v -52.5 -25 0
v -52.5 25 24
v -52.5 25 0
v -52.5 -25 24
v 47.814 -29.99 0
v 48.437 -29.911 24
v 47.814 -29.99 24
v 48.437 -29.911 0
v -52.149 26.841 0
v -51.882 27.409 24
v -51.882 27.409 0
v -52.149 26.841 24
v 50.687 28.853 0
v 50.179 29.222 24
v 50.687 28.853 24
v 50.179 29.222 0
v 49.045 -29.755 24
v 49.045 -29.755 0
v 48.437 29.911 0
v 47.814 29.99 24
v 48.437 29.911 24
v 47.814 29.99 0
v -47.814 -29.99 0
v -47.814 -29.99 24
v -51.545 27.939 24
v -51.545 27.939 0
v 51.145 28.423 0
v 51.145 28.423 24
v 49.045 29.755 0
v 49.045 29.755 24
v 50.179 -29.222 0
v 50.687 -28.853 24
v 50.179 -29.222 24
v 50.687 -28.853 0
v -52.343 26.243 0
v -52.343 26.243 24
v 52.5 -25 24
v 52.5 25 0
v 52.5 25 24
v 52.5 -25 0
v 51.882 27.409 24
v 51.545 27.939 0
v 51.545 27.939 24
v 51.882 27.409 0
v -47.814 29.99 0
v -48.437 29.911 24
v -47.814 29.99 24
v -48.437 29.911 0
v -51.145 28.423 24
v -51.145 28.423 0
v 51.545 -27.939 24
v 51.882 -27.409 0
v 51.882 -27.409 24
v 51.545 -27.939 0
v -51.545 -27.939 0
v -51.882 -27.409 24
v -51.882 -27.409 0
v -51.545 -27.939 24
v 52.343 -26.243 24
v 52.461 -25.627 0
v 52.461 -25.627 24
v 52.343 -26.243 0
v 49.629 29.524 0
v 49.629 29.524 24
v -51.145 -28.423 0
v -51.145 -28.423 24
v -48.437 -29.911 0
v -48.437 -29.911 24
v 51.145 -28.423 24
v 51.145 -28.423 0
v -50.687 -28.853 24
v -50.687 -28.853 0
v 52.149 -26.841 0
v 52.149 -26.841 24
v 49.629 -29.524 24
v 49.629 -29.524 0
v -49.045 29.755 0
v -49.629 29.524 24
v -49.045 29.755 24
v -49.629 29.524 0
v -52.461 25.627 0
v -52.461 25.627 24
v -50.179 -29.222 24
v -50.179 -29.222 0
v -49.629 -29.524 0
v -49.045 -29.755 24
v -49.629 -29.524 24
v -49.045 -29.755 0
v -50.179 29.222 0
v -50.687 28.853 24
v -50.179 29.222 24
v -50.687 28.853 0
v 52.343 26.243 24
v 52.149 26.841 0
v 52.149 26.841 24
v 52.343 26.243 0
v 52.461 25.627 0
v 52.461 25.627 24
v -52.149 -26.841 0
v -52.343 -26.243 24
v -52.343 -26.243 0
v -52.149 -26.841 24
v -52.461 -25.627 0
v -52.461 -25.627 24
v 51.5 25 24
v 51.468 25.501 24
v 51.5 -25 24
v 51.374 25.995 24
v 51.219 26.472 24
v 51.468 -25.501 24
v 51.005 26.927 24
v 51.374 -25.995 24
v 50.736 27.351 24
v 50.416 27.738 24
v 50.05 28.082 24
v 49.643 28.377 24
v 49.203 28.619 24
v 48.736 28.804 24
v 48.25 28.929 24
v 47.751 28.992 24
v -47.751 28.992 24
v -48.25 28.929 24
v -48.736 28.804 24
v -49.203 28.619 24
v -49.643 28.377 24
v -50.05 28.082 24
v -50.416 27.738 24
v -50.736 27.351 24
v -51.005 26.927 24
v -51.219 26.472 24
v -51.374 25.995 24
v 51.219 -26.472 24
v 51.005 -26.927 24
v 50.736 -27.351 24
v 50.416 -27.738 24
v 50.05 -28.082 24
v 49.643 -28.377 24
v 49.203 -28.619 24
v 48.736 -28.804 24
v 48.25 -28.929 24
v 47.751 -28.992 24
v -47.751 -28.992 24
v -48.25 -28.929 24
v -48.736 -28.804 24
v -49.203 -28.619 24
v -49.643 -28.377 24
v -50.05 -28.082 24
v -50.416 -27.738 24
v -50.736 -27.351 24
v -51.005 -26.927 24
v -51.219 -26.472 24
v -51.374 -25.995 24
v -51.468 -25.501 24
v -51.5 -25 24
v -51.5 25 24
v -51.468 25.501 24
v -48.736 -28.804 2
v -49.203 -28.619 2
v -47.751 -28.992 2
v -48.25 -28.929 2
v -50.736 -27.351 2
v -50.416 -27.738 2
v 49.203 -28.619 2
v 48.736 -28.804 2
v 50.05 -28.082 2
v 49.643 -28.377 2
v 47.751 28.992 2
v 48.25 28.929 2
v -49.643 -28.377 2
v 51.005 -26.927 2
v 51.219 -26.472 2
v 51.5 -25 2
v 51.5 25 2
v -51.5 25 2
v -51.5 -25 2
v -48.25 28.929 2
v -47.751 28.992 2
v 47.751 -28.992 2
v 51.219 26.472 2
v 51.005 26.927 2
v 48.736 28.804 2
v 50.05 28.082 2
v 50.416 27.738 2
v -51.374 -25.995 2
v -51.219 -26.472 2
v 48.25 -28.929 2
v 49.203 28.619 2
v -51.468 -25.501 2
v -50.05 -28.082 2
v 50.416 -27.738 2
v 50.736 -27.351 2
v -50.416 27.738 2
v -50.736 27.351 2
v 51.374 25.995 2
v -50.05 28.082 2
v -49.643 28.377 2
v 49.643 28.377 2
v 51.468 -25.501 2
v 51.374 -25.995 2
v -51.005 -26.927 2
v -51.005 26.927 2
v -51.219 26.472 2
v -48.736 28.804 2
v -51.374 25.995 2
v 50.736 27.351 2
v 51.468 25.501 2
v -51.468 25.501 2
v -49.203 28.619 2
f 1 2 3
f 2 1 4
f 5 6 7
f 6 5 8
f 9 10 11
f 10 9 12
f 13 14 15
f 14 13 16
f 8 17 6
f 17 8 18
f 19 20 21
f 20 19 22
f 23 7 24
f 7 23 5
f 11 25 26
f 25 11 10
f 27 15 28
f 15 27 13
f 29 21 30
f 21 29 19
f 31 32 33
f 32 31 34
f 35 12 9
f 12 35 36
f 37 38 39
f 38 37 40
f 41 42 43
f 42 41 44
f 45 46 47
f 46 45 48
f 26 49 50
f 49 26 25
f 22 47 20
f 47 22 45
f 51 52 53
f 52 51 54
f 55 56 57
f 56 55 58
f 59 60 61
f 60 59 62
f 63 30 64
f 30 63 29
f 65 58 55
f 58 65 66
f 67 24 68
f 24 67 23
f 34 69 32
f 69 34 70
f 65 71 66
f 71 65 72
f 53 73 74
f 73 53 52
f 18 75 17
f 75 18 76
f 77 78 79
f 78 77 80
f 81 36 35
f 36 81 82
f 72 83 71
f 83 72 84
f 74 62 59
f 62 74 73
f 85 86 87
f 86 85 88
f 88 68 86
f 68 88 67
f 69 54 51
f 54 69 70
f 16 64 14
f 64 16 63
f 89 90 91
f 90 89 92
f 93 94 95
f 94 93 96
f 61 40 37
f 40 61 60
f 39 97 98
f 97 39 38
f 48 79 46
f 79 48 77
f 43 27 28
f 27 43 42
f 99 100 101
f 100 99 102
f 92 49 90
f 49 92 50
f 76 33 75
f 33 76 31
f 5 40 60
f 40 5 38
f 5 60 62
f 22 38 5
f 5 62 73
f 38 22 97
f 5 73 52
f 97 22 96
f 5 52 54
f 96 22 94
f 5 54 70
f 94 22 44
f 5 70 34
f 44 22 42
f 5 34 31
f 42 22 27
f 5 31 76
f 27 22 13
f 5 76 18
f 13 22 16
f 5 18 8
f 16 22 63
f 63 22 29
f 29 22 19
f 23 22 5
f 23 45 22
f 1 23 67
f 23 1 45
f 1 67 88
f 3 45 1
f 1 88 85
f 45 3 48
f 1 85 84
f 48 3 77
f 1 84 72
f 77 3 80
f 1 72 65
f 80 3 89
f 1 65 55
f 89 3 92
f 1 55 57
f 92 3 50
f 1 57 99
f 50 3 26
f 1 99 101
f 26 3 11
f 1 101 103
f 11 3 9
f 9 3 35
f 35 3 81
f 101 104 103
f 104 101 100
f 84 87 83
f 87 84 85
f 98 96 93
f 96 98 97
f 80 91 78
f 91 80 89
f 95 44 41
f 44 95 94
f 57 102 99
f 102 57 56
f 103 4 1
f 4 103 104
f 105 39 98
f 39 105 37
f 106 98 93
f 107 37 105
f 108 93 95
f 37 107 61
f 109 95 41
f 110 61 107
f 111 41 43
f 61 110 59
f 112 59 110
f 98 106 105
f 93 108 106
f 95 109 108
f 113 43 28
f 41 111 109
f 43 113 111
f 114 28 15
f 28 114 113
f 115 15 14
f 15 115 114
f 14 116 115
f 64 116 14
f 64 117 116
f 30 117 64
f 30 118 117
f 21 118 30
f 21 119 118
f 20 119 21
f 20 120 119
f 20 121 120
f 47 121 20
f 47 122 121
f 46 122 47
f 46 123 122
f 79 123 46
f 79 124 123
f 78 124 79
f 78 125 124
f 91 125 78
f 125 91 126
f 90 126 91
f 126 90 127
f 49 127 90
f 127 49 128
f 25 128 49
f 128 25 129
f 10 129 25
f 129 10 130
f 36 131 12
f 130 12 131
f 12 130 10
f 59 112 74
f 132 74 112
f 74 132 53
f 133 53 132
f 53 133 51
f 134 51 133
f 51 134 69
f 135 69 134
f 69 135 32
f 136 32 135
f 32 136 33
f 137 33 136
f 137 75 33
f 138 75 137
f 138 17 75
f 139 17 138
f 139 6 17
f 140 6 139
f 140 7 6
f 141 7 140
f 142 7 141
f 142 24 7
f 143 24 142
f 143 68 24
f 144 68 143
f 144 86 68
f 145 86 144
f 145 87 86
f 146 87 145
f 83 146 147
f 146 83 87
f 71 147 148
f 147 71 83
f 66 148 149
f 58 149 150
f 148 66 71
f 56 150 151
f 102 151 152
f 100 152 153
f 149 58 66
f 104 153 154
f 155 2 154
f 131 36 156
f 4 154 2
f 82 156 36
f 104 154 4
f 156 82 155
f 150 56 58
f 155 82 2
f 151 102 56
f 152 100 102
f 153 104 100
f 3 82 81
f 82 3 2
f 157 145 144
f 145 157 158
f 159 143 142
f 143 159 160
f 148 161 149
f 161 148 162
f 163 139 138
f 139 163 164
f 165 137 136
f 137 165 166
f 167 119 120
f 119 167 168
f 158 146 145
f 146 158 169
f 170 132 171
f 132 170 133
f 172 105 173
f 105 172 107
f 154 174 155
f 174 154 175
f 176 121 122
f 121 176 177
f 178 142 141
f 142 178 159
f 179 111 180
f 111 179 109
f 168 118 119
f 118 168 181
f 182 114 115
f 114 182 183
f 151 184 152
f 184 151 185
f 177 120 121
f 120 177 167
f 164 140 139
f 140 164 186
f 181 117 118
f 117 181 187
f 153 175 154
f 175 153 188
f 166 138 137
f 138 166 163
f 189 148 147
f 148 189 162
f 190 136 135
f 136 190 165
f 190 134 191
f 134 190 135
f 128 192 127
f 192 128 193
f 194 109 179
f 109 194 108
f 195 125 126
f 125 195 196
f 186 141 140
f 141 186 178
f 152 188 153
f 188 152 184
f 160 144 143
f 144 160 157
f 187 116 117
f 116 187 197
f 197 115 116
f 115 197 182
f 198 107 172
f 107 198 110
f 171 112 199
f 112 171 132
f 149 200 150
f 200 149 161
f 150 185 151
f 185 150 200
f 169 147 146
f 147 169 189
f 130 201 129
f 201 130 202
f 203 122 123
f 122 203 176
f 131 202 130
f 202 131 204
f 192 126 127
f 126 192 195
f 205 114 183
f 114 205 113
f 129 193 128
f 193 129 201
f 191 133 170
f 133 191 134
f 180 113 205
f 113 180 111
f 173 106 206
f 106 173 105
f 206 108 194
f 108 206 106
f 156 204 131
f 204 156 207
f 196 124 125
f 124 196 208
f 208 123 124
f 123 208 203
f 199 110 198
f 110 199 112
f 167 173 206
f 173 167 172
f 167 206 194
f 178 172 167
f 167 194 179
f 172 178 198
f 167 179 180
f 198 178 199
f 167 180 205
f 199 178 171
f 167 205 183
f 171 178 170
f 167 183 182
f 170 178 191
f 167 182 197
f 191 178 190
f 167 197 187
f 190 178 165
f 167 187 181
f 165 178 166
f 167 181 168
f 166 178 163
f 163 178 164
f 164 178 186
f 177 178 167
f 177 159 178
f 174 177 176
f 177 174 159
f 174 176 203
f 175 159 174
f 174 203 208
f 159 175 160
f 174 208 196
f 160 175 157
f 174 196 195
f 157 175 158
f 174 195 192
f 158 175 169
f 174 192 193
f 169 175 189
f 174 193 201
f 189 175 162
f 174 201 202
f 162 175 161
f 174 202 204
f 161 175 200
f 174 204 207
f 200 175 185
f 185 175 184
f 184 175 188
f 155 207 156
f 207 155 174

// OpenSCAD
$fn = 50;


difference() {
	union() {
		hull() {
			translate(v = [-47.5000000000, 25.0000000000, 0]) {
				cylinder(h = 24, r = 5);
			}
			translate(v = [47.5000000000, 25.0000000000, 0]) {
				cylinder(h = 24, r = 5);
			}
			translate(v = [-47.5000000000, -25.0000000000, 0]) {
				cylinder(h = 24, r = 5);
			}
			translate(v = [47.5000000000, -25.0000000000, 0]) {
				cylinder(h = 24, r = 5);
			}
		}
	}
	union() {
		translate(v = [0, 0, 2]) {
			hull() {
				translate(v = [-47.5000000000, 25.0000000000, 0]) {
					cylinder(h = 22, r = 4);
				}
				translate(v = [47.5000000000, 25.0000000000, 0]) {
					cylinder(h = 22, r = 4);
				}
				translate(v = [-47.5000000000, -25.0000000000, 0]) {
					cylinder(h = 22, r = 4);
				}
				translate(v = [47.5000000000, -25.0000000000, 0]) {
					cylinder(h = 22, r = 4);
				}
			}
		}
	}
}
